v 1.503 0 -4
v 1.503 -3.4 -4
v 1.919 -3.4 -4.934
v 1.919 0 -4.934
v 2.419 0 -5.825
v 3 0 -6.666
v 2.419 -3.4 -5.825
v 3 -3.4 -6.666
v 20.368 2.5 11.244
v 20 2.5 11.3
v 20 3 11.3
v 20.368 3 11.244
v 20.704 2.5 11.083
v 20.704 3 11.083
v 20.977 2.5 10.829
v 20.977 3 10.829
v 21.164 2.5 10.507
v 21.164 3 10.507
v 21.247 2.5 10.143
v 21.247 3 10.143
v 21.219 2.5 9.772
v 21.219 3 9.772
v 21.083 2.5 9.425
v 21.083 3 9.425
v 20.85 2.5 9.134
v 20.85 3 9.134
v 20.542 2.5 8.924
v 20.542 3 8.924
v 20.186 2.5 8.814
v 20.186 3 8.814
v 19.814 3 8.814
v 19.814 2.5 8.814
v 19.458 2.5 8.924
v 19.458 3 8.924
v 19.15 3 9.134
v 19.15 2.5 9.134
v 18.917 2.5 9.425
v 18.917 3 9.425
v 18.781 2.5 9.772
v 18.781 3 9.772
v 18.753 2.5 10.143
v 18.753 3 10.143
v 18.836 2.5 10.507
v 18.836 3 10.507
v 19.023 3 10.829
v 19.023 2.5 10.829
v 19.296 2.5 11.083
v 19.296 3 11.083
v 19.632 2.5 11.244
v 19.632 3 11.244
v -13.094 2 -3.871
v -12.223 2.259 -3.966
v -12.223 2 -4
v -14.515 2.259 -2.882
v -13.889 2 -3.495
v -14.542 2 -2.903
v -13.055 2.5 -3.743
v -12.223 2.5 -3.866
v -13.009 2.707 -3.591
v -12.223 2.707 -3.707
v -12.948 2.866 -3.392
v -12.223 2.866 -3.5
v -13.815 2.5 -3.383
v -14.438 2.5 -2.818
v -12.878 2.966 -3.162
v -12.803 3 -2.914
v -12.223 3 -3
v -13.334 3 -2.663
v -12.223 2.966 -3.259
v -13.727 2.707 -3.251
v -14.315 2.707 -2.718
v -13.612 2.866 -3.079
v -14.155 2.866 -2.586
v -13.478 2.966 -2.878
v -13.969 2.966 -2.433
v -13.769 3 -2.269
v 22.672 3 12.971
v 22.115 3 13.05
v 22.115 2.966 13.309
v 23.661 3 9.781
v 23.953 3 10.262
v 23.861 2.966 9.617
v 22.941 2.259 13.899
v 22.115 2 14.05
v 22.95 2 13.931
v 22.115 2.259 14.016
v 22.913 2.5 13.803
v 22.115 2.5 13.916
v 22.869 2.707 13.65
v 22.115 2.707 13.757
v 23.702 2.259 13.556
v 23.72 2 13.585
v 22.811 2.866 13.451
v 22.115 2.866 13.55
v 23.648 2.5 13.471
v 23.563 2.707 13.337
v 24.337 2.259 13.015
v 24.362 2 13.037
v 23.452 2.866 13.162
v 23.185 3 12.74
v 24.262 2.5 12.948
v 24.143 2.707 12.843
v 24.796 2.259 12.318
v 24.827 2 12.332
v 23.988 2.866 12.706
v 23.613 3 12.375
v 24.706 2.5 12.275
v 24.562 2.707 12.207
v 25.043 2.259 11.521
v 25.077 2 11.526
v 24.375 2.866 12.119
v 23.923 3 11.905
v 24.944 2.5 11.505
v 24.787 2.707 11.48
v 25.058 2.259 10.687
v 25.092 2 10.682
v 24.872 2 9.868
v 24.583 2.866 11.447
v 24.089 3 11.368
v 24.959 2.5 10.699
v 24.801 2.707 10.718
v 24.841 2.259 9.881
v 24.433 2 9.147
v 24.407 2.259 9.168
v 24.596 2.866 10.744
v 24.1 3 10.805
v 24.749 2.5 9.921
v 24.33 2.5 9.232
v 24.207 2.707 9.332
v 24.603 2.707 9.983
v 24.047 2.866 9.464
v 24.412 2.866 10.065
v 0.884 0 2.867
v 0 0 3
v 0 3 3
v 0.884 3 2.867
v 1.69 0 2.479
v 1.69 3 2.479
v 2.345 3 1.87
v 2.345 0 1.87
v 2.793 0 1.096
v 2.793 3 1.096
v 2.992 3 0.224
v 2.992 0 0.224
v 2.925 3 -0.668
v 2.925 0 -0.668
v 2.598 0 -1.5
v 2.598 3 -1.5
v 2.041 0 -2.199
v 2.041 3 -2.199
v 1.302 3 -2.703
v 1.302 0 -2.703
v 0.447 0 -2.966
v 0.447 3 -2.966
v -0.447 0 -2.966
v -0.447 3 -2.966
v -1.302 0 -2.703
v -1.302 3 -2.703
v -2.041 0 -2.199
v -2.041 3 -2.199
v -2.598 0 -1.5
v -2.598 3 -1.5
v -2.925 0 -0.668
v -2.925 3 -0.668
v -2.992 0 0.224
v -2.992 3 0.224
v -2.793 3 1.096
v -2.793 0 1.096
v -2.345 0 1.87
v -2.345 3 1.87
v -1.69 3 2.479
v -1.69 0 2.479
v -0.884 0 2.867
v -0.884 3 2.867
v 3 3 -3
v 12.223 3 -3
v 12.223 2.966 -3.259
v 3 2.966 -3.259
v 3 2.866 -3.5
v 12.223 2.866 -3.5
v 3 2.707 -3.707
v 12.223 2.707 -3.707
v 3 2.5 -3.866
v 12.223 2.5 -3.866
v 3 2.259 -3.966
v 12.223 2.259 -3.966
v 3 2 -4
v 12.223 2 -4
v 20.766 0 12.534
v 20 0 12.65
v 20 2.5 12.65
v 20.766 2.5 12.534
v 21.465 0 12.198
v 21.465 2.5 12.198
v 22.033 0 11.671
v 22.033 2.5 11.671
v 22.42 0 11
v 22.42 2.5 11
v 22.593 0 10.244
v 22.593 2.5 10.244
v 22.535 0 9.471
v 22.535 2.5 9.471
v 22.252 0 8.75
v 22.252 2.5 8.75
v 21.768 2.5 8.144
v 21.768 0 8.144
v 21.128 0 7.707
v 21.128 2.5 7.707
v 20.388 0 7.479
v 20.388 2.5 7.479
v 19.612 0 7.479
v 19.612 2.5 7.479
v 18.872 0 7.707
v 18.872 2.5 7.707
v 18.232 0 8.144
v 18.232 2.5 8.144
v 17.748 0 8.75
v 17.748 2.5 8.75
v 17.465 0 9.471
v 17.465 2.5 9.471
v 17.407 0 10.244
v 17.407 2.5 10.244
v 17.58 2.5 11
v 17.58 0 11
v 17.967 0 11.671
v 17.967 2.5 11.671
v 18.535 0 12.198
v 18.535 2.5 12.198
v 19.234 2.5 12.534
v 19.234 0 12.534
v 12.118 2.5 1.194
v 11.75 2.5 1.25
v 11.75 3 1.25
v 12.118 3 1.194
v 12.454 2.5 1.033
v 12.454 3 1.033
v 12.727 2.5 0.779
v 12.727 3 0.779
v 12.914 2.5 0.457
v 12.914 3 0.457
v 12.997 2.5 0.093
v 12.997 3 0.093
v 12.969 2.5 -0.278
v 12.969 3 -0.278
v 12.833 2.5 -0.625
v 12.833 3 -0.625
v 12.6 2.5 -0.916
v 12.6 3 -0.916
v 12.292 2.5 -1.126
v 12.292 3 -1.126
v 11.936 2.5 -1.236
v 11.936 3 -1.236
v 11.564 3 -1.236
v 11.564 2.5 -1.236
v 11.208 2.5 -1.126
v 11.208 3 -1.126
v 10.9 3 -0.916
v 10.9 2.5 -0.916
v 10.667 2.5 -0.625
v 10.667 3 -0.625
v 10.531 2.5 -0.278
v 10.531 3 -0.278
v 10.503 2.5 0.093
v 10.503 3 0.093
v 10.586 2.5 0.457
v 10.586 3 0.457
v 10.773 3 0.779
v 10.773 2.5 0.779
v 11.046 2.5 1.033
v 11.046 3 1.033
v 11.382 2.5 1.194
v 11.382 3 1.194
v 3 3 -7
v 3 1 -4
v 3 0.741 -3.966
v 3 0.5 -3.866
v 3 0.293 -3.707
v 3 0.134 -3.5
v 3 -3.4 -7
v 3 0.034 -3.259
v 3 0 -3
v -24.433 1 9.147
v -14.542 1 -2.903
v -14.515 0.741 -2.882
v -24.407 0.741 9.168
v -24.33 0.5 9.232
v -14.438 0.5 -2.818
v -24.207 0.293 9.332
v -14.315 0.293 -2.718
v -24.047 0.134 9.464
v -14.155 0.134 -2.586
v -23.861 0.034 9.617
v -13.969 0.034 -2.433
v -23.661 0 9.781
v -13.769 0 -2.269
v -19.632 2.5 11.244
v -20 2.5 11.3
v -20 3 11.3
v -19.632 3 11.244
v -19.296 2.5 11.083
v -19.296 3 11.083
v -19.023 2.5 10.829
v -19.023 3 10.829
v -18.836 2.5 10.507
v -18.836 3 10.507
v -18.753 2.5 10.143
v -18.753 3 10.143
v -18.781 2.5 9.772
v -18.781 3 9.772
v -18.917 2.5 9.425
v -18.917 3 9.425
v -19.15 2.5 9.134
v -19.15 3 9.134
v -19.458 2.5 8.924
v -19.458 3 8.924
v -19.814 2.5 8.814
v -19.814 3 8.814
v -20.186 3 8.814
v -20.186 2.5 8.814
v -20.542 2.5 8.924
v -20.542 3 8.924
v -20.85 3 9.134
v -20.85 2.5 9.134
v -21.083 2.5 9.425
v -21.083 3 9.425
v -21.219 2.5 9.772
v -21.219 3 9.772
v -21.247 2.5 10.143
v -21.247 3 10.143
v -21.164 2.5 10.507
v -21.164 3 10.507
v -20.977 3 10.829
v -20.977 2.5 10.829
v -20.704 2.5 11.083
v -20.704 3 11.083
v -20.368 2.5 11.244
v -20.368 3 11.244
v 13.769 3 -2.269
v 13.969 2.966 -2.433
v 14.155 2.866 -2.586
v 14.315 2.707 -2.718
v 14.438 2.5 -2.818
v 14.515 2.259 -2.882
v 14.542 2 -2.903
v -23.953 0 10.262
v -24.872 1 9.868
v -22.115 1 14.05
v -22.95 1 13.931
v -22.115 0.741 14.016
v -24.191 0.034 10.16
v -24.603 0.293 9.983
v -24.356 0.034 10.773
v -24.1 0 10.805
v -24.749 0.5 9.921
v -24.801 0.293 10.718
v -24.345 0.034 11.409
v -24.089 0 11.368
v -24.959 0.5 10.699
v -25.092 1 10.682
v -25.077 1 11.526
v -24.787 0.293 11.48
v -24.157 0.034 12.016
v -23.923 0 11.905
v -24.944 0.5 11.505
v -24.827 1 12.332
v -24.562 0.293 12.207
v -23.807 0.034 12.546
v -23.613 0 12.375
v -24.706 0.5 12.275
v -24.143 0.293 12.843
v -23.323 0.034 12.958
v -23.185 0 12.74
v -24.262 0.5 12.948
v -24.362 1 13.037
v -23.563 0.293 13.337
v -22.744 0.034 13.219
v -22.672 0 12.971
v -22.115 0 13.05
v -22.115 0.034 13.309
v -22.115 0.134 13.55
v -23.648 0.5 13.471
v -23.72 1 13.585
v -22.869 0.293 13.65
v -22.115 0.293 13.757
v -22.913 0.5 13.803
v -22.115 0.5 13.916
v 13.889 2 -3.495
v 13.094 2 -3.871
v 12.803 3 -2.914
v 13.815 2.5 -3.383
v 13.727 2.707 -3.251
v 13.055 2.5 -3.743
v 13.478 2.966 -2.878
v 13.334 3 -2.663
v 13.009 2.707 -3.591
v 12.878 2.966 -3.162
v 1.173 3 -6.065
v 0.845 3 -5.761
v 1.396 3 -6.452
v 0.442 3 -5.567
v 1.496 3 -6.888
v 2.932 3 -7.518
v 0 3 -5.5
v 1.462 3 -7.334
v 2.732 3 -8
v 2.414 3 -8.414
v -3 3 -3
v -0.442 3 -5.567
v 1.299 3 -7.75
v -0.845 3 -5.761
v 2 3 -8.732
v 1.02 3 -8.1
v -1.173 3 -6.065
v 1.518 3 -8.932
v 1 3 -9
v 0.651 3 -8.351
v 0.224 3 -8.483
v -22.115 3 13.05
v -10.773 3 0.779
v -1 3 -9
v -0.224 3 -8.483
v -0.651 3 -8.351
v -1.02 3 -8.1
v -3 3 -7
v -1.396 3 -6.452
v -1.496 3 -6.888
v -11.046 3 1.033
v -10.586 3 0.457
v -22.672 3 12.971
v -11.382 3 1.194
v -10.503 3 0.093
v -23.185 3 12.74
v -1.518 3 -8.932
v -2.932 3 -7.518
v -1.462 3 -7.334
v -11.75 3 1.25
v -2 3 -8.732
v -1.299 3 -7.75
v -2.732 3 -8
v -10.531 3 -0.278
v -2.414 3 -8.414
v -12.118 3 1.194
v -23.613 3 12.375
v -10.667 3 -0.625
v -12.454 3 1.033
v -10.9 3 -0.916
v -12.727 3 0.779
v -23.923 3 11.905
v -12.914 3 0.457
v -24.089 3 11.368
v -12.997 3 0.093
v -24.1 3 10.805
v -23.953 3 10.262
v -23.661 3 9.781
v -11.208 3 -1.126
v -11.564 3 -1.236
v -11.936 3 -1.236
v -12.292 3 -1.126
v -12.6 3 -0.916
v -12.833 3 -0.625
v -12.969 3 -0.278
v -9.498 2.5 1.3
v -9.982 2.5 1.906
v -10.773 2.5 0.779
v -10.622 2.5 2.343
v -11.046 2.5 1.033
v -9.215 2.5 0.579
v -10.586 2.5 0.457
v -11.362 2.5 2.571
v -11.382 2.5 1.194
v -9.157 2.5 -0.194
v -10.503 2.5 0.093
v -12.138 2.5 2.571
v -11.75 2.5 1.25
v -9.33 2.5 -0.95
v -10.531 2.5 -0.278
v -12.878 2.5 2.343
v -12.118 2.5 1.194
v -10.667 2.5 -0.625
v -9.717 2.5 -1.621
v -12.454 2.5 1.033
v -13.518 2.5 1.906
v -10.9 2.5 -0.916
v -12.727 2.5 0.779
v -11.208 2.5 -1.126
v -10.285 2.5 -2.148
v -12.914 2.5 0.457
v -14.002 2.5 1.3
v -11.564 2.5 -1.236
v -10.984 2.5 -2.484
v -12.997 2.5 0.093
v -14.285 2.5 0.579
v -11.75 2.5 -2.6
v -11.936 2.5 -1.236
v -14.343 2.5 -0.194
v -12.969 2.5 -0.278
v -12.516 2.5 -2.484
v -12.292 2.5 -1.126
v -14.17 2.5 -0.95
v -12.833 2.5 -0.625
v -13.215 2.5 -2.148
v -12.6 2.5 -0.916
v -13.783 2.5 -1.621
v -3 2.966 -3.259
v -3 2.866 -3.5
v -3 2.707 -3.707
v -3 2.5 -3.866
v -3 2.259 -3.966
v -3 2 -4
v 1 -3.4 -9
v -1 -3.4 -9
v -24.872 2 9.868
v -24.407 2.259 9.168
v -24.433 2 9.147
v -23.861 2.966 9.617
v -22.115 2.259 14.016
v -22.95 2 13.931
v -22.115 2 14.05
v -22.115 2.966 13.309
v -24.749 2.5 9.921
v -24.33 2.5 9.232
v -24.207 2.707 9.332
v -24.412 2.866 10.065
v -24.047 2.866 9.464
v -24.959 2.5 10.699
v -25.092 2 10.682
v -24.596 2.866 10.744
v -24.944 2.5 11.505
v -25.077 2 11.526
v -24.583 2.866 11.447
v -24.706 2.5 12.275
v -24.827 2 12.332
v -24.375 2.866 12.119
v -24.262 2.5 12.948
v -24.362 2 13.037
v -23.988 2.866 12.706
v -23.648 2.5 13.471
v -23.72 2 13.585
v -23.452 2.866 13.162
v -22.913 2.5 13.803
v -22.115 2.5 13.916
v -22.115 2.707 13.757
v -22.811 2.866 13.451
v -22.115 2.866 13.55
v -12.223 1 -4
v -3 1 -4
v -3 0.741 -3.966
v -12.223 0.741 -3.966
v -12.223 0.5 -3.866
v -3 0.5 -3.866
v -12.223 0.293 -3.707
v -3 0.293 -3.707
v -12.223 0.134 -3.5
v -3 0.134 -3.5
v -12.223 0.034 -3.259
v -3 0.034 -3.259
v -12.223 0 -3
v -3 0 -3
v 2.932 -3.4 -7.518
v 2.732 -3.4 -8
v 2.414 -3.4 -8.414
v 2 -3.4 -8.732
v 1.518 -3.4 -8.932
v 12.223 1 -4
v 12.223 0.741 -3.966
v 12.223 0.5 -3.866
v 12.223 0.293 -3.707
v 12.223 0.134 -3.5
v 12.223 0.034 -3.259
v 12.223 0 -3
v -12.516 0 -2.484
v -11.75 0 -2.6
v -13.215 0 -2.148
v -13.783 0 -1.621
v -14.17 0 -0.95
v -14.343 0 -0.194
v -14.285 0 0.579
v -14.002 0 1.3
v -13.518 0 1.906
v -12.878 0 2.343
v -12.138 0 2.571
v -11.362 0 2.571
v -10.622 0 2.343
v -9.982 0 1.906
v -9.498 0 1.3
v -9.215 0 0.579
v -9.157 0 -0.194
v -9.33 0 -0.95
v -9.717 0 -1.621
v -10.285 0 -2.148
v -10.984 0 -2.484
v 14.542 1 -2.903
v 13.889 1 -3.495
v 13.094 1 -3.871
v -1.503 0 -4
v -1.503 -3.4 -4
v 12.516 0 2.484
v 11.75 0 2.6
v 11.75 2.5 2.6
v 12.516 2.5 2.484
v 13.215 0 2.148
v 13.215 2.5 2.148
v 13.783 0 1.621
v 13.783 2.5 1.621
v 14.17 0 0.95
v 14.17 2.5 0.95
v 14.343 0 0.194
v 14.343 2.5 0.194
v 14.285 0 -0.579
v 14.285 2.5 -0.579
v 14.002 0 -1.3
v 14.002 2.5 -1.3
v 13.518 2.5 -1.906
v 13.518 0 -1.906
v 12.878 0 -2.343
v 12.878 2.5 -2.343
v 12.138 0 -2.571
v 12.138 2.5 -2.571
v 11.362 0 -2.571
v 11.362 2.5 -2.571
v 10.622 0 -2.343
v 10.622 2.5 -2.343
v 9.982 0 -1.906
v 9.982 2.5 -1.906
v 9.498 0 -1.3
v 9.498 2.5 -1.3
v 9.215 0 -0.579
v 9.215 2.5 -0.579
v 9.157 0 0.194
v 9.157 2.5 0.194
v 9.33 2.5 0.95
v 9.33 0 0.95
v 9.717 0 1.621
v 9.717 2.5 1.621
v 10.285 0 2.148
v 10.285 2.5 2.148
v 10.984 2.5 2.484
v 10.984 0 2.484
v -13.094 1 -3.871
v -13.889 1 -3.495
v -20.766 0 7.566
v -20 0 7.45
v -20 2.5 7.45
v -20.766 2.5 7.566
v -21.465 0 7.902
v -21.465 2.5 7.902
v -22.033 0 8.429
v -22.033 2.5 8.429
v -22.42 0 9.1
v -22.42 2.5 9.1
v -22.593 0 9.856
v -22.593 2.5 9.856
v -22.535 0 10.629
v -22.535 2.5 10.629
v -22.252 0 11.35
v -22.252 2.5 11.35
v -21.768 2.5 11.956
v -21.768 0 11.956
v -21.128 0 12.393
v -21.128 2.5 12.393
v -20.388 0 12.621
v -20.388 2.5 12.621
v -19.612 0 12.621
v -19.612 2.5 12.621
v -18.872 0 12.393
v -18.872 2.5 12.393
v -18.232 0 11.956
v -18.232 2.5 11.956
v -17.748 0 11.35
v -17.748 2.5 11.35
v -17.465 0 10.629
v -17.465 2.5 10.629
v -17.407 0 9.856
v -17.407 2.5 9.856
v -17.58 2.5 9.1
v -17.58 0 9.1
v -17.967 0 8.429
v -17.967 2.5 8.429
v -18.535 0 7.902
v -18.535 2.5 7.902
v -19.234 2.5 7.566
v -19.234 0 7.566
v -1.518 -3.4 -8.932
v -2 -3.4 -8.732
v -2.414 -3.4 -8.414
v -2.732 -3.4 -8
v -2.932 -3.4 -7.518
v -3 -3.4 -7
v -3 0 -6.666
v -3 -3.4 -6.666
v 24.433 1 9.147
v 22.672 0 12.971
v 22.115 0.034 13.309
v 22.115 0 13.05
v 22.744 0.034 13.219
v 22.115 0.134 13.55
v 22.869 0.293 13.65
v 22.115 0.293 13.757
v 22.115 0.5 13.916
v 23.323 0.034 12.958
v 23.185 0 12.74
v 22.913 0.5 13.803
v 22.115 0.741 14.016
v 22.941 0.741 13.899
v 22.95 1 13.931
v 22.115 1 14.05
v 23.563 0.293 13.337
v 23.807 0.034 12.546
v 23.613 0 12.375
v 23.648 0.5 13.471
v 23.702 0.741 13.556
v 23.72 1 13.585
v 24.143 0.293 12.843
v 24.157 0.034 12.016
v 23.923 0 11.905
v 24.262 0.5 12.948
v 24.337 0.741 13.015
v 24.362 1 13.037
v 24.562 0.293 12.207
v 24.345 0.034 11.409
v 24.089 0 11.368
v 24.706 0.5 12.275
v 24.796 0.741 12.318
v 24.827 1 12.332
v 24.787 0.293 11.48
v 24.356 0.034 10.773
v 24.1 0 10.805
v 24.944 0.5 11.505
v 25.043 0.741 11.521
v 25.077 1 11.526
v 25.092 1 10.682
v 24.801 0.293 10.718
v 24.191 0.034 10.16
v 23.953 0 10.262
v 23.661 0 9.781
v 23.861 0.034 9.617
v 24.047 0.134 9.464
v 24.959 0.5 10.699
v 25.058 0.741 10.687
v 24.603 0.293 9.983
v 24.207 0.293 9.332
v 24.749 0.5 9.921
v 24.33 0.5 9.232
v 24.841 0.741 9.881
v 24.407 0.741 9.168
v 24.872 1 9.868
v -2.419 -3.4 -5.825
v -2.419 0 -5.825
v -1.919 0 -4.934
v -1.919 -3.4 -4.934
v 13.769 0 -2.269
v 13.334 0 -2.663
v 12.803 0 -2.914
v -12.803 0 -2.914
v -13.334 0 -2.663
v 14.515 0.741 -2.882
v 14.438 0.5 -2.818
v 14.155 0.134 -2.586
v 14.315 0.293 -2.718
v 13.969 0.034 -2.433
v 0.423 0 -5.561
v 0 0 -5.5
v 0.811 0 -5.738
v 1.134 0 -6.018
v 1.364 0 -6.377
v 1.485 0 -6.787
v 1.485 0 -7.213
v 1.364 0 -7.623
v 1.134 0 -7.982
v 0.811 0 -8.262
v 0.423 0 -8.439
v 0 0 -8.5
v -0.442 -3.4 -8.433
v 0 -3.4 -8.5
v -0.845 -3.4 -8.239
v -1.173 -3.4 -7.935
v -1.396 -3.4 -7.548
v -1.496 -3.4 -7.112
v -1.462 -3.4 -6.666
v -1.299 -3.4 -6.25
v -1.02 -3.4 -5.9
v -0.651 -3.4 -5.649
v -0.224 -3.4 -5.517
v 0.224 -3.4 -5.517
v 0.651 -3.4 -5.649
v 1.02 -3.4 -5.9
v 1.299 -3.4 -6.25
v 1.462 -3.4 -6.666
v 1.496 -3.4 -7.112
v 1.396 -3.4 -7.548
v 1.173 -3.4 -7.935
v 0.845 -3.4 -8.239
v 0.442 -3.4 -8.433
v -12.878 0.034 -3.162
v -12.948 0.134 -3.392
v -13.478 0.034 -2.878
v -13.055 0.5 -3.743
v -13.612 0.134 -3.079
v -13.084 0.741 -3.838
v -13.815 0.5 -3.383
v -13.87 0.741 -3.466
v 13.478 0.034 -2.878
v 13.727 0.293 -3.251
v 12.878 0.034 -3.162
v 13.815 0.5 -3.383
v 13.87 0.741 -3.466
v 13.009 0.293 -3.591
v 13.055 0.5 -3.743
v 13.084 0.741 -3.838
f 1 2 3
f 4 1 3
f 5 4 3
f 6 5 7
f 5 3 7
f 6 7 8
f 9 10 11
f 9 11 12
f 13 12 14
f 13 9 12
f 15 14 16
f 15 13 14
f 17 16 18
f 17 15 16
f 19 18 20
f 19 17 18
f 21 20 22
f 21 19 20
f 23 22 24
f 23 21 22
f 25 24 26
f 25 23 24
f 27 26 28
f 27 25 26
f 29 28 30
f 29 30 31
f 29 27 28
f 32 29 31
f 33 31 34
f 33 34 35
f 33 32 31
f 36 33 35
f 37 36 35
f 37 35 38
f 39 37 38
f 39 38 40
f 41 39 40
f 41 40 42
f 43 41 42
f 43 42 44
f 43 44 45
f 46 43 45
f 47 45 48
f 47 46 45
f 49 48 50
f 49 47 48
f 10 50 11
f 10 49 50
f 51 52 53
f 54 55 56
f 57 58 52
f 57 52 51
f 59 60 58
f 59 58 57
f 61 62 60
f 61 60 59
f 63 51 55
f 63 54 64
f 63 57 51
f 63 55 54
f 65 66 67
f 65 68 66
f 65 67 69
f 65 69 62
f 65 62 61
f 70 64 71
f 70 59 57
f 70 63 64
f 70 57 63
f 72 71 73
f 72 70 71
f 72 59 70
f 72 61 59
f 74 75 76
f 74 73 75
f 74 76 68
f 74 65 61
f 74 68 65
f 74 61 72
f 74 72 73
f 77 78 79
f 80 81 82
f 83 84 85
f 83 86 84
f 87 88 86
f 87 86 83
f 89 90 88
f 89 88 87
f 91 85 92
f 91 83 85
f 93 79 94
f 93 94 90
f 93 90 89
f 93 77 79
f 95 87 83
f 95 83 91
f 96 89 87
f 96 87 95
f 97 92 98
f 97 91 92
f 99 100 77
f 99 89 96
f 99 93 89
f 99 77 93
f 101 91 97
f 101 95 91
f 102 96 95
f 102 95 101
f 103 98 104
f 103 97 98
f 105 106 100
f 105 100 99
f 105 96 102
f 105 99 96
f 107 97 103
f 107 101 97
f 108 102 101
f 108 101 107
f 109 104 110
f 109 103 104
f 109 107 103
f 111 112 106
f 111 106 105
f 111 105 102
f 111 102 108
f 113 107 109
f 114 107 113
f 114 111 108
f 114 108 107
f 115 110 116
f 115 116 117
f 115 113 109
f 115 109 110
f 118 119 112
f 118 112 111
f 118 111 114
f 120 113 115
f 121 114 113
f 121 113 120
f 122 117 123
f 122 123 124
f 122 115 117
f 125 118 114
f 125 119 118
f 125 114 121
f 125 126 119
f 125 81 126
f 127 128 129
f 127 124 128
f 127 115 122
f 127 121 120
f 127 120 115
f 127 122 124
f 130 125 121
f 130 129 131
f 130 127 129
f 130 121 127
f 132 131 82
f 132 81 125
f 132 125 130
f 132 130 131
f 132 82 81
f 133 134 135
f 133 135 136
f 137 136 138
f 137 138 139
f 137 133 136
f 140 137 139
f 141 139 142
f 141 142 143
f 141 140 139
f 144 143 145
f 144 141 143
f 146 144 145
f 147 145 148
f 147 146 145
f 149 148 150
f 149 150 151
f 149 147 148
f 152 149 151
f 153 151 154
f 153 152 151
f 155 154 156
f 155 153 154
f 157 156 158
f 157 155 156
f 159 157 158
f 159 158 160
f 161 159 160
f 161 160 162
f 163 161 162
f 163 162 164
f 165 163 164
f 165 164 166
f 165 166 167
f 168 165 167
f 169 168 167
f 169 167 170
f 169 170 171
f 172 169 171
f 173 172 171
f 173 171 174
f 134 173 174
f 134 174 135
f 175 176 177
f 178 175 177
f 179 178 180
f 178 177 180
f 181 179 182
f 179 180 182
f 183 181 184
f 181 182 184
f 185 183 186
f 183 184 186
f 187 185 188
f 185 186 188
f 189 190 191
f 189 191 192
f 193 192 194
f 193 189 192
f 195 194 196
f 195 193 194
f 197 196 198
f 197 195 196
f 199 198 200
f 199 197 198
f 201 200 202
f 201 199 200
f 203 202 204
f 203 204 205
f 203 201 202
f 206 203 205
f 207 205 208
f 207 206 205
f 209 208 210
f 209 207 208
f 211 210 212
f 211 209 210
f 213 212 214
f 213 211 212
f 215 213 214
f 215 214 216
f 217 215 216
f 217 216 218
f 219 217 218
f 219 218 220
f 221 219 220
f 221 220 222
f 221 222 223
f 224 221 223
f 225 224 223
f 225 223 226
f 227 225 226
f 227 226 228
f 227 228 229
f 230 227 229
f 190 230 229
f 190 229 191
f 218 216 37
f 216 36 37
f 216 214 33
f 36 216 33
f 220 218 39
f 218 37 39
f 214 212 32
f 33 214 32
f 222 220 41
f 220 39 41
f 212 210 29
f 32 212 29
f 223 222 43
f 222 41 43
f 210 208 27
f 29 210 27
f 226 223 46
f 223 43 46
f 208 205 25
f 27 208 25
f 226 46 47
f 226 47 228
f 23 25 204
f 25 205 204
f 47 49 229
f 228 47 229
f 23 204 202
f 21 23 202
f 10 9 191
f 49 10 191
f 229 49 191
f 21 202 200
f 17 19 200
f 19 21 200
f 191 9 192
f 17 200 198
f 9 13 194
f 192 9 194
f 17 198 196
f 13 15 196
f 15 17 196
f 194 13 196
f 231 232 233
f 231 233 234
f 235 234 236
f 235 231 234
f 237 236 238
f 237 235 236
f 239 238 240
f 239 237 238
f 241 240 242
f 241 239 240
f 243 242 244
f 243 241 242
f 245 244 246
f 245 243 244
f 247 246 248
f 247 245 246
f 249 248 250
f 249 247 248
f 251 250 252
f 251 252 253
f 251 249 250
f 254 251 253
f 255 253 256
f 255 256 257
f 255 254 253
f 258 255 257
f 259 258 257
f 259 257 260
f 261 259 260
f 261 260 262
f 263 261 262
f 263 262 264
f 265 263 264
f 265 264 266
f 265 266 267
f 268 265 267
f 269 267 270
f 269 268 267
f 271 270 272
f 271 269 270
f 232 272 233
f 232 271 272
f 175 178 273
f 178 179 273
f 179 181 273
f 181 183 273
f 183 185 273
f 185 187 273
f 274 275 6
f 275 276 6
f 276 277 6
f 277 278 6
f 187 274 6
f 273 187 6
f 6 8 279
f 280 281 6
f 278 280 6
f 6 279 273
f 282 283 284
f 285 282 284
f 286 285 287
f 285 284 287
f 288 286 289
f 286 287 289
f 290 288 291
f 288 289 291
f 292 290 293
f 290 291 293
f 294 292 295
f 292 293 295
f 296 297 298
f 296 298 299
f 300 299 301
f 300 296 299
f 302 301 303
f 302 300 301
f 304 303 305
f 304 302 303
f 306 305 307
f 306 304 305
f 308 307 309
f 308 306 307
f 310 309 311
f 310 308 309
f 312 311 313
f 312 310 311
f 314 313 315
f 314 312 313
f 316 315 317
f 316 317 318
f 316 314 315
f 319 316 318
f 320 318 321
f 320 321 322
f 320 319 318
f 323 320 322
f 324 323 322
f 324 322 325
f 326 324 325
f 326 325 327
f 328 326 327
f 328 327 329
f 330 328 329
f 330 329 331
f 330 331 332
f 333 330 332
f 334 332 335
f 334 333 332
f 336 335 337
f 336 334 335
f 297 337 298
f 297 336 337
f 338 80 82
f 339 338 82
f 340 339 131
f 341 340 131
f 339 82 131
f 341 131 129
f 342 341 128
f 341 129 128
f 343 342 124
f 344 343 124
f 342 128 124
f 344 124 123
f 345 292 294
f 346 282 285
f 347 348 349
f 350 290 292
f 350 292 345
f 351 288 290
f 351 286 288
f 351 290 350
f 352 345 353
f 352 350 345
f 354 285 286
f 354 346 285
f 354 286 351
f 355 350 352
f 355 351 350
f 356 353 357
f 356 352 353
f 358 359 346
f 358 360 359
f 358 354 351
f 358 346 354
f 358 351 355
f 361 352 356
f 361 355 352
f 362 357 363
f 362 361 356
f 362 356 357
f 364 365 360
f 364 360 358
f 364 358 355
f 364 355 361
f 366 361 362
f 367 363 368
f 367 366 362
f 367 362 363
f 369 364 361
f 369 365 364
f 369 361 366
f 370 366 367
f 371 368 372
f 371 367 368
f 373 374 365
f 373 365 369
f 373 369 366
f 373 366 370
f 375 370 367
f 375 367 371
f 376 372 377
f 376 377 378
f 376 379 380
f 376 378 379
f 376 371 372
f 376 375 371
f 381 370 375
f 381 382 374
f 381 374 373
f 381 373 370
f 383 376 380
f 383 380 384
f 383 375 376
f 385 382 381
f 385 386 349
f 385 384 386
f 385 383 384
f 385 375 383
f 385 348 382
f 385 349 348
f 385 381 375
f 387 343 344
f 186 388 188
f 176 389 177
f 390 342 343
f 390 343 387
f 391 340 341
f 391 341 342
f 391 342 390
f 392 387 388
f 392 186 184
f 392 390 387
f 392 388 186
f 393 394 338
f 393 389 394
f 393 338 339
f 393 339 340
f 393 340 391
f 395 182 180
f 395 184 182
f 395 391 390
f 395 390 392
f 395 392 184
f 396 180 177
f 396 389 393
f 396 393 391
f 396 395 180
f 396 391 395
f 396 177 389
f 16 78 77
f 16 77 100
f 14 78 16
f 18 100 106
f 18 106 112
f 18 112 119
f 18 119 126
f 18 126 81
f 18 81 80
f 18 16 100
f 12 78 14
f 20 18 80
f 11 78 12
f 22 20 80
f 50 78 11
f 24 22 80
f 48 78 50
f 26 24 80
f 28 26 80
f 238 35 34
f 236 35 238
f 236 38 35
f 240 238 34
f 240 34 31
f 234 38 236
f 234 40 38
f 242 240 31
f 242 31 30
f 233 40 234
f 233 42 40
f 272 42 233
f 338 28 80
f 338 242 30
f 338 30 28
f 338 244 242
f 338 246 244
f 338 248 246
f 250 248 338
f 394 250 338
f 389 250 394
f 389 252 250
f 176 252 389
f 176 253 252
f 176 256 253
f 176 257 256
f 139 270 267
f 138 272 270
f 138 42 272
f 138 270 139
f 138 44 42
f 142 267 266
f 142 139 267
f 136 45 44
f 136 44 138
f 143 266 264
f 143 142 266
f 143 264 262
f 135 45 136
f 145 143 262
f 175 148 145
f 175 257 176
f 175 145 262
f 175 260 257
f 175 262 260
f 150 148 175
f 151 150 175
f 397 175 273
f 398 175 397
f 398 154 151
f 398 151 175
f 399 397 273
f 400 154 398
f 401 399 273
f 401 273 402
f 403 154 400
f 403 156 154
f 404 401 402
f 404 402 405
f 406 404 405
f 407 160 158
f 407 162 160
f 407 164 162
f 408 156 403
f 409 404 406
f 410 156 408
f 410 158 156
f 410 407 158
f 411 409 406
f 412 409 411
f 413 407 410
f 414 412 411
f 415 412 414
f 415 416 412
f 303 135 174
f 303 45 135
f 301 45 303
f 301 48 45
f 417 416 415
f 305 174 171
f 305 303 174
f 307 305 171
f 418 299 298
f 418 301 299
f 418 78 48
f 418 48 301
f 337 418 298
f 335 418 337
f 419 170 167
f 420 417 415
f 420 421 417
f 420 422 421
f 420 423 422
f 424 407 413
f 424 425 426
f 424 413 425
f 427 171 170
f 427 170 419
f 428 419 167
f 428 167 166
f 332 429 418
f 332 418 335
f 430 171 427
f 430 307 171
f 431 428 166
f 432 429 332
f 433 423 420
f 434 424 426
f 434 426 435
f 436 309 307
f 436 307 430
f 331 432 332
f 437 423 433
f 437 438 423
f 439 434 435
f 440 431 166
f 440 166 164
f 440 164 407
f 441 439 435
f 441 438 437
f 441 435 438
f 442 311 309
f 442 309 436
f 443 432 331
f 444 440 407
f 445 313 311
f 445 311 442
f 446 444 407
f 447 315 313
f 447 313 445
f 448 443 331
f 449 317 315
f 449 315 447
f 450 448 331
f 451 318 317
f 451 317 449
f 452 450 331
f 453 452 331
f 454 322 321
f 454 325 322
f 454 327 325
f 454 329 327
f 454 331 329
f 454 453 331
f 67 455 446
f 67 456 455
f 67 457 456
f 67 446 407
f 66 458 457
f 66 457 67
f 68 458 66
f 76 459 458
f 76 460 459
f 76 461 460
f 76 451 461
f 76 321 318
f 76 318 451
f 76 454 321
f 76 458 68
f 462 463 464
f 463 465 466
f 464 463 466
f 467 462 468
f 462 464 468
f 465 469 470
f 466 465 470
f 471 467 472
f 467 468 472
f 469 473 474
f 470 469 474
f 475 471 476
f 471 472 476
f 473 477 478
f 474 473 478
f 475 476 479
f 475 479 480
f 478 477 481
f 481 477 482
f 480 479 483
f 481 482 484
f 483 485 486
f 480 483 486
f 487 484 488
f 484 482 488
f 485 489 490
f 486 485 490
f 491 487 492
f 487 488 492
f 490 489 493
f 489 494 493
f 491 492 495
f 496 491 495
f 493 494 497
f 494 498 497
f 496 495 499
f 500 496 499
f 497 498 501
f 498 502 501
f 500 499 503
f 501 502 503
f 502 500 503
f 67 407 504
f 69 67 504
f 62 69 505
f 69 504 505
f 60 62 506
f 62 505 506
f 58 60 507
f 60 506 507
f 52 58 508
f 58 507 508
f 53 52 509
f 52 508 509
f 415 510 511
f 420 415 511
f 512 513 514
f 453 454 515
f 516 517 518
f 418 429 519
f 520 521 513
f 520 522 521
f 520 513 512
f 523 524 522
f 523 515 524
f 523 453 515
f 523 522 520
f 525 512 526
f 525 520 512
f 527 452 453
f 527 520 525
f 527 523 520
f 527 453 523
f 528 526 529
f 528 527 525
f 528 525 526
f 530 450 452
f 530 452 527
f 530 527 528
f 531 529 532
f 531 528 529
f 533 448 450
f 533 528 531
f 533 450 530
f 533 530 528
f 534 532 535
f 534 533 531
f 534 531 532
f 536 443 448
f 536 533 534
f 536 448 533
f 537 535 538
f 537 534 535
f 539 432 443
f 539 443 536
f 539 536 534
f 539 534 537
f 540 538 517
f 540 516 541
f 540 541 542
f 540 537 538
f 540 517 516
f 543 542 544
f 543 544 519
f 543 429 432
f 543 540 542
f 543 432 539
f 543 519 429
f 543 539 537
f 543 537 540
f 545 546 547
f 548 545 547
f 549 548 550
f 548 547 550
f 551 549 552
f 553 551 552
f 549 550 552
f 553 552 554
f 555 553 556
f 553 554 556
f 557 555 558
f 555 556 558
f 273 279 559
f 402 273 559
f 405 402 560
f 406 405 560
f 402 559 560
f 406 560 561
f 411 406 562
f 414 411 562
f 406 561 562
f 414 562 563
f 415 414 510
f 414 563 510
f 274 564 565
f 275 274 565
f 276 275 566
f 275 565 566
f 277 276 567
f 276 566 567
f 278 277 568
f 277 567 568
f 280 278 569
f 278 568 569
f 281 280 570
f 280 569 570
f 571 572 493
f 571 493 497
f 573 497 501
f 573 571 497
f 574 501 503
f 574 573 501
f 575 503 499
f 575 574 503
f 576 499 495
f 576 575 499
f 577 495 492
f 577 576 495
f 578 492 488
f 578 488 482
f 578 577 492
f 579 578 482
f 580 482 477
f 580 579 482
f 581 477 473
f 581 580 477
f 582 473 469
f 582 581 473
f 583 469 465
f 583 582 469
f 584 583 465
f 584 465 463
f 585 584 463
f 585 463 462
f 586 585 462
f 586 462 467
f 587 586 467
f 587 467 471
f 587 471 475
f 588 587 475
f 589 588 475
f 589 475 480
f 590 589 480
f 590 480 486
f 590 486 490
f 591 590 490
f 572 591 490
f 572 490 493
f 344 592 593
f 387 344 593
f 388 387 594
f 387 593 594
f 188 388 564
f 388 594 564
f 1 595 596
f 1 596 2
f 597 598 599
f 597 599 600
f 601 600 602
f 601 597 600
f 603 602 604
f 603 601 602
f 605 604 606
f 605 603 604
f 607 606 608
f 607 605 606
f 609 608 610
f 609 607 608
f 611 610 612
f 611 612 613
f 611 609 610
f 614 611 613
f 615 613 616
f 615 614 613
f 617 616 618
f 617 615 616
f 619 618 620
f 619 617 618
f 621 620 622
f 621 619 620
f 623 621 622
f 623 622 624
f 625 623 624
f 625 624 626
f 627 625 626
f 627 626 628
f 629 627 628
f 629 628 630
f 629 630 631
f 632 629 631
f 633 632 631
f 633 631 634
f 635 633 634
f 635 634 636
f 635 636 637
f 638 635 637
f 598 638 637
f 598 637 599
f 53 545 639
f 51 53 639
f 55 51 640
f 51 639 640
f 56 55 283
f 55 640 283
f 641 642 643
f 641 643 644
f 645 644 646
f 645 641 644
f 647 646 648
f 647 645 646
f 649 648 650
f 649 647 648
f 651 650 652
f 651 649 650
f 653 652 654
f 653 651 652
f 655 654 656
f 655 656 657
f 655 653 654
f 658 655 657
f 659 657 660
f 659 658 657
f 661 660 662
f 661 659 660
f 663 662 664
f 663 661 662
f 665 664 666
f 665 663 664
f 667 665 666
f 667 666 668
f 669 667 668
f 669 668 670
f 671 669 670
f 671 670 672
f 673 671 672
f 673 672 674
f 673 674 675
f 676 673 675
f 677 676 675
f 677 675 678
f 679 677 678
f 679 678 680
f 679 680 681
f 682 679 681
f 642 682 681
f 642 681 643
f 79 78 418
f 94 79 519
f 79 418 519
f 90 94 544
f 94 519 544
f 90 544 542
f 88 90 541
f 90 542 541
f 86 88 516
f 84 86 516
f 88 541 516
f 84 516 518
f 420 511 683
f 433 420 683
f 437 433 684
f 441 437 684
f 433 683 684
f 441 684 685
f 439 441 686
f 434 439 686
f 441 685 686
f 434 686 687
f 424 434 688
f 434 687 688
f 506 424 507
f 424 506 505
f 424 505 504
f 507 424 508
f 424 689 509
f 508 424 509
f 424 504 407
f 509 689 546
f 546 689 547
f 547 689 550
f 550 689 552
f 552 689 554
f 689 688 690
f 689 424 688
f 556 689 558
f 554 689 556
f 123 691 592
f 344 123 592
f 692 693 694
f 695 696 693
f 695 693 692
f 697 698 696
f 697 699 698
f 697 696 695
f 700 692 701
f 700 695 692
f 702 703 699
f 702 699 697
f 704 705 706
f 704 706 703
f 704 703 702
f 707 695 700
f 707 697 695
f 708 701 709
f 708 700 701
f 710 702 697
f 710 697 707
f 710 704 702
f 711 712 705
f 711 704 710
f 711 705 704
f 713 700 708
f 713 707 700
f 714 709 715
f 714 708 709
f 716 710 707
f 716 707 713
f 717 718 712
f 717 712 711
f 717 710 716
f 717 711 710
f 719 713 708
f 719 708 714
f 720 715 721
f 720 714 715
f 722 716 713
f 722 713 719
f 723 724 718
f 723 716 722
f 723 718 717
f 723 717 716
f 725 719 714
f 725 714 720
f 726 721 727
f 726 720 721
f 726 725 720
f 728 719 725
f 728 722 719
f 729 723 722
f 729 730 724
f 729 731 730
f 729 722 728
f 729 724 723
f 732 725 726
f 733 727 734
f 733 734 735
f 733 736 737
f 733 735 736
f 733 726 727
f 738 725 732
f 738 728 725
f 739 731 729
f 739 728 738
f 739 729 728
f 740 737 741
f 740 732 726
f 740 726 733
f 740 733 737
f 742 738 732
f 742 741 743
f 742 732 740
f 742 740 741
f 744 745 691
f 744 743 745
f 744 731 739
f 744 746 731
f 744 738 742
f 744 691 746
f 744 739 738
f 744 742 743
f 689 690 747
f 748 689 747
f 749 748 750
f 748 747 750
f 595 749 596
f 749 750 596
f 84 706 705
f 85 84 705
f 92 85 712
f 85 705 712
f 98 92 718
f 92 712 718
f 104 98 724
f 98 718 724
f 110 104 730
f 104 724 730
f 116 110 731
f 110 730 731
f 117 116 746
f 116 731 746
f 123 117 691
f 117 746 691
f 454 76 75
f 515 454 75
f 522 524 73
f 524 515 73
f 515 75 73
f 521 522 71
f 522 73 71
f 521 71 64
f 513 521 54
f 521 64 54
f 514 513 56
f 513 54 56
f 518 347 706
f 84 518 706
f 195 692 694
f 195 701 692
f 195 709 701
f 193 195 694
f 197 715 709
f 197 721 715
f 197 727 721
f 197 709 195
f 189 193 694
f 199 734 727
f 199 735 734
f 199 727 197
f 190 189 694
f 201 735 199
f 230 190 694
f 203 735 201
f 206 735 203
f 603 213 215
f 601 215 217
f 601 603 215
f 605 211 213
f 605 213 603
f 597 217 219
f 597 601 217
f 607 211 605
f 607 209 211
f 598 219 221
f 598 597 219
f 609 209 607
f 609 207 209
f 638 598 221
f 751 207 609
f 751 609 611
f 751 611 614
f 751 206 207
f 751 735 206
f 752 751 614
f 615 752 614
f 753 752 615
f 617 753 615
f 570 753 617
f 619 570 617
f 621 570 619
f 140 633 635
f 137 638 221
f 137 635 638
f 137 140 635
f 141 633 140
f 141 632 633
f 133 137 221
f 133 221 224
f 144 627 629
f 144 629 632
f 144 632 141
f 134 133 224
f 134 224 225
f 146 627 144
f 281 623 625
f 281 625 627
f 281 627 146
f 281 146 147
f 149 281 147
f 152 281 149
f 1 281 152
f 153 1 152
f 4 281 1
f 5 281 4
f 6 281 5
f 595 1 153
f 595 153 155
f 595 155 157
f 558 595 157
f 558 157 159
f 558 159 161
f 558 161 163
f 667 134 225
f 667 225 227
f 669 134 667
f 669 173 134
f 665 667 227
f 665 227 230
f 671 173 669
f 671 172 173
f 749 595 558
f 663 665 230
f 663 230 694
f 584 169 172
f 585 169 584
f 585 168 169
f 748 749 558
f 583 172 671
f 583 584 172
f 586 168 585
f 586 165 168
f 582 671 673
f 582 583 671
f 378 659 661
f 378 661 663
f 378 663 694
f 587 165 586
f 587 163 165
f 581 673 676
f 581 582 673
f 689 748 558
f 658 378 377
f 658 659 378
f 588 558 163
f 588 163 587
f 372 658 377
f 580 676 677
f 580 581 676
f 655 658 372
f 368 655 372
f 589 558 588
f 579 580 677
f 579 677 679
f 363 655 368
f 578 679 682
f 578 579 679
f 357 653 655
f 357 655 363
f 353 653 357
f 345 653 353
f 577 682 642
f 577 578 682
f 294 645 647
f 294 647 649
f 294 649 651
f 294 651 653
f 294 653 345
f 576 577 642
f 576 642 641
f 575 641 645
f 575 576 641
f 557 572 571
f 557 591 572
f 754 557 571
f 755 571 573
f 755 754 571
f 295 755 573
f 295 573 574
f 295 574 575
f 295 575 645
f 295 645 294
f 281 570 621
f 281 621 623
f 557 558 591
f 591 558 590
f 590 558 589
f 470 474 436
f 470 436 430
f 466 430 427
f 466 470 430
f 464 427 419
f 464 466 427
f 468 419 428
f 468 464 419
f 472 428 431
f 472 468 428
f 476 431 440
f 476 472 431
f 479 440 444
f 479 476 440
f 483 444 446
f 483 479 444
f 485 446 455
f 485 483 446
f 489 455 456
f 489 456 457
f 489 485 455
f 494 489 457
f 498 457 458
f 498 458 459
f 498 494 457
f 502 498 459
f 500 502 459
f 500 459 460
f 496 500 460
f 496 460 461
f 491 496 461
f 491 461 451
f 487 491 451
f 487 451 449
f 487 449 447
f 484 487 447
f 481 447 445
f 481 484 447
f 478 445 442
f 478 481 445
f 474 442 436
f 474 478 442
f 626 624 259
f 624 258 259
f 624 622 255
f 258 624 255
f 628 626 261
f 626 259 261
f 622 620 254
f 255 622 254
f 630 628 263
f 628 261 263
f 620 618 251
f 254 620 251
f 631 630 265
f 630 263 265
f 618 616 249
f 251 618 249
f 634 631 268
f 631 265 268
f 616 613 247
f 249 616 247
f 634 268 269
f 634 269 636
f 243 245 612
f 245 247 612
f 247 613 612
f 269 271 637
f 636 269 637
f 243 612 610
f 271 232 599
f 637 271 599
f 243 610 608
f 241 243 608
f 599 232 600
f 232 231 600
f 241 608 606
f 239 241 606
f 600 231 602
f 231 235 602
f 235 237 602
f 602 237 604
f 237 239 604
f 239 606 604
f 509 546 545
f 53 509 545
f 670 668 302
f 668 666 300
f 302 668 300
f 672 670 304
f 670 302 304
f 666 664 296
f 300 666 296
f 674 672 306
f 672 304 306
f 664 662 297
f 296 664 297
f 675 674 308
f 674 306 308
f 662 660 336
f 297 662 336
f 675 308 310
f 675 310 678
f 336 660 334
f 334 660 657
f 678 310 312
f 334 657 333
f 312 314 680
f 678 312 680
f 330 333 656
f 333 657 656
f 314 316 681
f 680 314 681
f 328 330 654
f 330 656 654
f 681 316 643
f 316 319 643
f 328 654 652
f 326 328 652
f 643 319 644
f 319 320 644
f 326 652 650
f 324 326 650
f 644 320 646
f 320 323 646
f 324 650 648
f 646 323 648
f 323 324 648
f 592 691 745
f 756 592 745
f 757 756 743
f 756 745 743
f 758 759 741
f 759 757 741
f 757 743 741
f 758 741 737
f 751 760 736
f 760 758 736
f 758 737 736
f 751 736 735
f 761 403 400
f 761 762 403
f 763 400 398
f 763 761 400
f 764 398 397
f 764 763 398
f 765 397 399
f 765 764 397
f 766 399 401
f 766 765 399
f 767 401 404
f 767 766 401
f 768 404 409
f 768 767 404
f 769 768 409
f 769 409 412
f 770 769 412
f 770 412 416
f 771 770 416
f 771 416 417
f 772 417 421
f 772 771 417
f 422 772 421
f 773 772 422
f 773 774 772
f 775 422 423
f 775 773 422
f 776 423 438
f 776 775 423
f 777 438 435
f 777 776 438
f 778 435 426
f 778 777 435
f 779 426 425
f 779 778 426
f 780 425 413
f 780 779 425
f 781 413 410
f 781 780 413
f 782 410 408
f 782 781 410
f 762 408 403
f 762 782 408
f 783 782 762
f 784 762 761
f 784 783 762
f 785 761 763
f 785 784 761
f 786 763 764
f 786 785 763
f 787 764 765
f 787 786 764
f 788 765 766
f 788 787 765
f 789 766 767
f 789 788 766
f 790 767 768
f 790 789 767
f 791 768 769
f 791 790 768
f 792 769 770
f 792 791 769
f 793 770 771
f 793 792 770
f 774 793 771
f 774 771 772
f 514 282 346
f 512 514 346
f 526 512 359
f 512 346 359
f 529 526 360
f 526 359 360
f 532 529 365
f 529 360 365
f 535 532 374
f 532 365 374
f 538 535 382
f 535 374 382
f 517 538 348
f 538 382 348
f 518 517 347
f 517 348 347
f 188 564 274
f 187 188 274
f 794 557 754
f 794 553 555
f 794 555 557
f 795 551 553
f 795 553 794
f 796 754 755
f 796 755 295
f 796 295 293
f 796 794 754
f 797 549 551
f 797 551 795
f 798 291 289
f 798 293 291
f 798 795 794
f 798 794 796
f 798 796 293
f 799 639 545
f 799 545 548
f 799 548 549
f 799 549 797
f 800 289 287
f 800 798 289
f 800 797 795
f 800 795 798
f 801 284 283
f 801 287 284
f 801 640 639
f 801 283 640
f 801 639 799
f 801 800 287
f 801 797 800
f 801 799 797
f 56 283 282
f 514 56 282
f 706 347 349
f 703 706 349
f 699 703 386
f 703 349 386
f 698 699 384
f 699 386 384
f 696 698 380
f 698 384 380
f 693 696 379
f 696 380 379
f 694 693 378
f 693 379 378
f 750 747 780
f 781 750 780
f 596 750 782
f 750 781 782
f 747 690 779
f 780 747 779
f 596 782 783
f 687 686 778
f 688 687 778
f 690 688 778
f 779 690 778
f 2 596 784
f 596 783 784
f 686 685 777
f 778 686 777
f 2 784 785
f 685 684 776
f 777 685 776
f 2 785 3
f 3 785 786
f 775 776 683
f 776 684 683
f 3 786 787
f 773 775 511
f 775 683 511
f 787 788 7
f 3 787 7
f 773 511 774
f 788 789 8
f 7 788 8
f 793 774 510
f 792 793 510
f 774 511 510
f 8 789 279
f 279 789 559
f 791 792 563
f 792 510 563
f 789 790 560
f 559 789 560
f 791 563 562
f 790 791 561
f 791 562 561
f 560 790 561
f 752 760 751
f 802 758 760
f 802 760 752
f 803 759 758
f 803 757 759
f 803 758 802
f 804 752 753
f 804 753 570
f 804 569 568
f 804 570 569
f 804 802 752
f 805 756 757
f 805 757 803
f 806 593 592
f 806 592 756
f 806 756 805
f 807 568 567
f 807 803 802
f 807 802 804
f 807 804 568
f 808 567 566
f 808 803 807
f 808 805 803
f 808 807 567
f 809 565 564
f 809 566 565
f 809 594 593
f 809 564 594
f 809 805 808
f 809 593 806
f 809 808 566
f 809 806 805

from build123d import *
from build123d.topology import SkipClean

# Parameters (mm, degrees)
SKETCH1_R           = 3
SKETCH1_R_2         = 2.6
SKETCH1_R_3         = 1.5
BOSS_EXTRUDE1_DEPTH = 3
BOSS_EXTRUDE3_START = -0.5
SKETCH3_R           = 2.6
SKETCH3_R_2         = 1.25
BOSS_EXTRUDE3_DEPTH = 0.5
BOSS_EXTRUDE4_START = 3.4
SKETCH4_R           = 1.5
BOSS_EXTRUDE4_DEPTH = 3.4
FILLET1_R           = 1
SKETCH5_R           = 11
CUT_EXTRUDE1_DEPTH  = 3.4


with BuildPart() as part:
    # Sketch1 → Boss-Extrude1 (new body)
    with BuildSketch(Plane(origin=(0, 0, 0), x_dir=(1, 0, 0), z_dir=(0, 1, 0))):
        with BuildLine():
            Line((-14.54167044, 2.903480135), (-24.433461485, -9.146519865))
            ThreePointArc((-24.433461485, -9.146519865), (-24.826727515, -12.332489687), (-22.114676593, -14.05))
            Line((-22.114676593, -14.05), (22.114676593, -14.05))
            ThreePointArc((22.114676593, -14.05), (24.826727515, -12.332489687), (24.433461485, -9.146519865))
            Line((24.433461485, -9.146519865), (14.54167044, 2.903480135))
            ThreePointArc((14.54167044, 2.903480135), (13.505375235, 3.712050922), (12.222885548, 4))
            Line((12.222885548, 4), (3, 4))
            Line((3, 4), (3, 7))
            ThreePointArc((3, 7), (2.414213562, 8.414213562), (1, 9))
            Line((1, 9), (-1, 9))
            ThreePointArc((-1, 9), (-2.414213562, 8.414213562), (-3, 7))
            Line((-3, 7), (-3, 4))
            Line((-3, 4), (-12.222885548, 4))
            ThreePointArc((-12.222885548, 4), (-13.505375235, 3.712050922), (-14.54167044, 2.903480135))
        make_face()
        with Locations(Location((0, 0, 0), (0, 0, 270))):
            Circle(SKETCH1_R, mode=Mode.SUBTRACT)
        with Locations(Location((11.75, 0, 0), (0, 0, 270))):
            Circle(SKETCH1_R_2, mode=Mode.SUBTRACT)
        with Locations(Location((20, -10.05, 0), (0, 0, 270))):
            Circle(SKETCH1_R_2, mode=Mode.SUBTRACT)
        with Locations(Location((-20, -10.05, 0), (0, 0, 90))):
            Circle(SKETCH1_R_2, mode=Mode.SUBTRACT)
        with Locations(Location((-11.75, 0, 0), (0, 0, 90))):
            Circle(SKETCH1_R_2, mode=Mode.SUBTRACT)
        with Locations(Location((0, 7, 0), (0, 0, 270))):
            Circle(SKETCH1_R_3, mode=Mode.SUBTRACT)
    extrude(amount=BOSS_EXTRUDE1_DEPTH)

    # Sketch3 → Boss-Extrude3 (add)
    # profile 1 of 4: a face of its own
    with BuildSketch(Plane(origin=(0, 3, 0), x_dir=(1, 0, 0), z_dir=(0, 1, 0)).offset(BOSS_EXTRUDE3_START)):
        with Locations(Location((-11.75, 0, 0), (0, 0, 90))):
            Circle(SKETCH3_R)
        with Locations(Location((-11.75, 0, 0), (0, 0, 270))):
            Circle(SKETCH3_R_2, mode=Mode.SUBTRACT)
    # profile 2 of 4: a face of its own
    with BuildSketch(Plane(origin=(0, 3, 0), x_dir=(1, 0, 0), z_dir=(0, 1, 0)).offset(BOSS_EXTRUDE3_START)):
        with Locations(Location((-20, -10.05, 0), (0, 0, 90))):
            Circle(SKETCH3_R)
        with Locations(Location((-20, -10.05, 0), (0, 0, 270))):
            Circle(SKETCH3_R_2, mode=Mode.SUBTRACT)
    # profile 3 of 4: a face of its own
    with BuildSketch(Plane(origin=(0, 3, 0), x_dir=(1, 0, 0), z_dir=(0, 1, 0)).offset(BOSS_EXTRUDE3_START)):
        with Locations(Location((11.75, 0, 0), (0, 0, 270))):
            Circle(SKETCH3_R)
        with Locations(Location((11.75, 0, 0), (0, 0, 270))):
            Circle(SKETCH3_R_2, mode=Mode.SUBTRACT)
    # profile 4 of 4: a face of its own
    with BuildSketch(Plane(origin=(0, 3, 0), x_dir=(1, 0, 0), z_dir=(0, 1, 0)).offset(BOSS_EXTRUDE3_START)):
        with Locations(Location((20, -10.05, 0), (0, 0, 270))):
            Circle(SKETCH3_R)
        with Locations(Location((20, -10.05, 0), (0, 0, 270))):
            Circle(SKETCH3_R_2, mode=Mode.SUBTRACT)
    extrude(amount=BOSS_EXTRUDE3_DEPTH)

    # Sketch4 → Boss-Extrude4 (add)
    with SkipClean():  # the faces are left unmerged after this step: merging them gives an invalid solid
        with BuildSketch(Plane(origin=(0, 0, 0), x_dir=(-1, 0, 0), z_dir=(0, -1, 0)).offset(BOSS_EXTRUDE4_START)):
            with BuildLine():
                Line((-3, 4), (-3, 7))
                ThreePointArc((-3, 7), (-2.414213562, 8.414213562), (-1, 9))
                Line((-1, 9), (1, 9))
                ThreePointArc((1, 9), (2.414213562, 8.414213562), (3, 7))
                Line((3, 7), (3, 4))
                Line((3, 4), (-3, 4))
            make_face()
            with Locations(Location((0, 7, 0), (0, 0, 90))):
                Circle(SKETCH4_R, mode=Mode.SUBTRACT)
        extrude(amount=-BOSS_EXTRUDE4_DEPTH)

    # Fillet1
    # the kernel refuses this fillet: 1 mm, written as the material it takes off along each edge
    with BuildSketch(Plane(origin=(-22.114676593, 3, 11.05), x_dir=(-0.772928297309301, 0, -0.6344933783882578), z_dir=(0.6344933783882578, 0, -0.772928297309301))) as fillet1_piece_1:
        with BuildLine():
            CenterArc((3 - FILLET1_R, -FILLET1_R), FILLET1_R, 0, 90)
            Line((3, -FILLET1_R), (3, 0))
            Line((3, 0), (3 - FILLET1_R, 0))
        make_face()
    revolve(axis=Axis((-22.114676593, 3, 11.05), (0, 1, 0)), revolution_arc=129.38241941, mode=Mode.SUBTRACT)
    with BuildSketch(Plane(origin=(-3, 0, -4), x_dir=(0, 1, 0), z_dir=(-1, 0, 0)), Plane(origin=(12.222885548, 3, -4), x_dir=(0, 0, 1), z_dir=(-1, 0, 0))) as fillet1_piece_2:
        with BuildLine():
            CenterArc((FILLET1_R, -FILLET1_R), FILLET1_R, 90, 90)
            Line((0, -FILLET1_R), (0, 0))
            Line((0, 0), (FILLET1_R, 0))
        make_face()
    extrude(amount=9.222885548, mode=Mode.SUBTRACT)
    with BuildSketch(Plane(origin=(12.222885548, 0, -4), x_dir=(0, 0, 1), z_dir=(-1, 0, 0)), Plane(origin=(-3, 3, -4), x_dir=(0, -1, 0), z_dir=(-1, 0, 0))) as fillet1_piece_3:
        with BuildLine():
            CenterArc((FILLET1_R, FILLET1_R), FILLET1_R, 180, 90)
            Line((0, FILLET1_R), (0, 0))
            Line((0, 0), (FILLET1_R, 0))
        make_face()
    extrude(amount=9.222885548, mode=Mode.SUBTRACT)
    with BuildSketch(Plane(origin=(12.222885548, 0, -1), x_dir=(0.7729282973093169, 0, -0.6344933783882384), z_dir=(0.6344933783882384, 0, 0.7729282973093169))) as fillet1_piece_4:
        with BuildLine():
            CenterArc((3 - FILLET1_R, FILLET1_R), FILLET1_R, 270, 90)
            Line((3, FILLET1_R), (3, 0))
            Line((3, 0), (3 - FILLET1_R, 0))
        make_face()
    revolve(axis=Axis((12.222885548, 0, -1), (0, 1, 0)), revolution_arc=50.61758059, mode=Mode.SUBTRACT)
    with BuildSketch(Plane(origin=(-22.114676593, 3, 14.05), x_dir=(0, 0, -1), z_dir=(1, 0, 0))) as fillet1_piece_5:
        with BuildLine():
            CenterArc((FILLET1_R, -FILLET1_R), FILLET1_R, 90, 90)
            Line((0, -FILLET1_R), (0, 0))
            Line((0, 0), (FILLET1_R, 0))
        make_face()
    extrude(amount=44.229353186, mode=Mode.SUBTRACT)
    with BuildSketch(Plane(origin=(24.433461485, 0, 9.146519865), x_dir=(-0.7729282973093136, 0, 0.6344933783882426), z_dir=(-0.6344933783882426, 0, -0.7729282973093136)), Plane(origin=(-14.54167044, 3, -2.903480135), x_dir=(0, -1, 0), z_dir=(-0.6344933783882424, 0, 0.7729282973093137))) as fillet1_piece_6:
        with BuildLine():
            CenterArc((FILLET1_R, FILLET1_R), FILLET1_R, 180, 90)
            Line((0, FILLET1_R), (0, 0))
            Line((0, 0), (FILLET1_R, 0))
        make_face()
    extrude(amount=15.590061901, mode=Mode.SUBTRACT)
    with BuildSketch(Plane(origin=(22.114676593, 0, 11.05), x_dir=(0, 0, 1), z_dir=(-1, 0, 0))) as fillet1_piece_7:
        with BuildLine():
            CenterArc((3 - FILLET1_R, FILLET1_R), FILLET1_R, 270, 90)
            Line((3, FILLET1_R), (3, 0))
            Line((3, 0), (3 - FILLET1_R, 0))
        make_face()
    revolve(axis=Axis((22.114676593, 0, 11.05), (0, 1, 0)), revolution_arc=129.38241941, mode=Mode.SUBTRACT)
    with BuildSketch(Plane(origin=(-22.114676593, 0, 14.05), x_dir=(0, 0, -1), z_dir=(1, 0, 0))) as fillet1_piece_8:
        with BuildLine():
            CenterArc((FILLET1_R, FILLET1_R), FILLET1_R, 180, 90)
            Line((0, FILLET1_R), (0, 0))
            Line((0, 0), (FILLET1_R, 0))
        make_face()
    extrude(amount=44.229353186, mode=Mode.SUBTRACT)
    with BuildSketch(Plane(origin=(-22.114676593, 0, 11.05), x_dir=(-0.772928297309301, 0, -0.6344933783882578), z_dir=(0.6344933783882578, 0, -0.772928297309301))) as fillet1_piece_9:
        with BuildLine():
            CenterArc((3 - FILLET1_R, FILLET1_R), FILLET1_R, 270, 90)
            Line((3, FILLET1_R), (3, 0))
            Line((3, 0), (3 - FILLET1_R, 0))
        make_face()
    revolve(axis=Axis((-22.114676593, 0, 11.05), (0, 1, 0)), revolution_arc=129.38241941, mode=Mode.SUBTRACT)
    with BuildSketch(Plane(origin=(-14.54167044, 0, -2.903480135), x_dir=(0, 1, 0), z_dir=(-0.6344933783882424, 0, 0.7729282973093137)), Plane(origin=(24.433461485, 3, 9.146519865), x_dir=(-0.7729282973093136, 0, 0.6344933783882426), z_dir=(-0.6344933783882426, 0, -0.7729282973093136))) as fillet1_piece_10:
        with BuildLine():
            CenterArc((FILLET1_R, -FILLET1_R), FILLET1_R, 90, 90)
            Line((0, -FILLET1_R), (0, 0))
            Line((0, 0), (FILLET1_R, 0))
        make_face()
    extrude(amount=15.590061901, mode=Mode.SUBTRACT)
    with BuildSketch(Plane(origin=(-12.222885548, 0, -1), x_dir=(0, 0, -1), z_dir=(1, 0, 0))) as fillet1_piece_11:
        with BuildLine():
            CenterArc((3 - FILLET1_R, FILLET1_R), FILLET1_R, 270, 90)
            Line((3 - FILLET1_R, 0), (3, 0))
            Line((3, 0), (3, FILLET1_R))
        make_face()
    revolve(axis=Axis((-12.222885548, 0, -1), (0, 1, 0)), revolution_arc=50.61758059, mode=Mode.SUBTRACT)
    with BuildSketch(Plane(origin=(22.114676593, 3, 11.05), x_dir=(0, 0, 1), z_dir=(-1, 0, 0))) as fillet1_piece_12:
        with BuildLine():
            CenterArc((3 - FILLET1_R, -FILLET1_R), FILLET1_R, 0, 90)
            Line((3, -FILLET1_R), (3, 0))
            Line((3, 0), (3 - FILLET1_R, 0))
        make_face()
    revolve(axis=Axis((22.114676593, 3, 11.05), (0, 1, 0)), revolution_arc=129.38241941, mode=Mode.SUBTRACT)
    with BuildSketch(Plane(origin=(12.222885548, 3, -1), x_dir=(0.7729282973093169, 0, -0.6344933783882384), z_dir=(0.6344933783882384, 0, 0.7729282973093169))) as fillet1_piece_13:
        with BuildLine():
            CenterArc((3 - FILLET1_R, -FILLET1_R), FILLET1_R, 0, 90)
            Line((3, -FILLET1_R), (3, 0))
            Line((3, 0), (3 - FILLET1_R, 0))
        make_face()
    revolve(axis=Axis((12.222885548, 3, -1), (0, 1, 0)), revolution_arc=50.61758059, mode=Mode.SUBTRACT)
    with BuildSketch(Plane(origin=(-12.222885548, 3, -1), x_dir=(0, 0, -1), z_dir=(1, 0, 0))) as fillet1_piece_14:
        with BuildLine():
            CenterArc((3 - FILLET1_R, -FILLET1_R), FILLET1_R, 0, 90)
            Line((3 - FILLET1_R, 0), (3, 0))
            Line((3, 0), (3, -FILLET1_R))
        make_face()
    revolve(axis=Axis((-12.222885548, 3, -1), (0, 1, 0)), revolution_arc=50.61758059, mode=Mode.SUBTRACT)

    # Sketch5 → Cut-Extrude1 (cut)
    with BuildSketch(Plane(origin=(0, -3.4, 0), x_dir=(-1, 0, 0), z_dir=(0, -1, 0))):
        with Locations((-11.75, 0)):
            Circle(SKETCH5_R)
        with Locations((11.75, 0)):
            Circle(SKETCH5_R)
    extrude(amount=-CUT_EXTRUDE1_DEPTH, mode=Mode.SUBTRACT)


solid = part.part
